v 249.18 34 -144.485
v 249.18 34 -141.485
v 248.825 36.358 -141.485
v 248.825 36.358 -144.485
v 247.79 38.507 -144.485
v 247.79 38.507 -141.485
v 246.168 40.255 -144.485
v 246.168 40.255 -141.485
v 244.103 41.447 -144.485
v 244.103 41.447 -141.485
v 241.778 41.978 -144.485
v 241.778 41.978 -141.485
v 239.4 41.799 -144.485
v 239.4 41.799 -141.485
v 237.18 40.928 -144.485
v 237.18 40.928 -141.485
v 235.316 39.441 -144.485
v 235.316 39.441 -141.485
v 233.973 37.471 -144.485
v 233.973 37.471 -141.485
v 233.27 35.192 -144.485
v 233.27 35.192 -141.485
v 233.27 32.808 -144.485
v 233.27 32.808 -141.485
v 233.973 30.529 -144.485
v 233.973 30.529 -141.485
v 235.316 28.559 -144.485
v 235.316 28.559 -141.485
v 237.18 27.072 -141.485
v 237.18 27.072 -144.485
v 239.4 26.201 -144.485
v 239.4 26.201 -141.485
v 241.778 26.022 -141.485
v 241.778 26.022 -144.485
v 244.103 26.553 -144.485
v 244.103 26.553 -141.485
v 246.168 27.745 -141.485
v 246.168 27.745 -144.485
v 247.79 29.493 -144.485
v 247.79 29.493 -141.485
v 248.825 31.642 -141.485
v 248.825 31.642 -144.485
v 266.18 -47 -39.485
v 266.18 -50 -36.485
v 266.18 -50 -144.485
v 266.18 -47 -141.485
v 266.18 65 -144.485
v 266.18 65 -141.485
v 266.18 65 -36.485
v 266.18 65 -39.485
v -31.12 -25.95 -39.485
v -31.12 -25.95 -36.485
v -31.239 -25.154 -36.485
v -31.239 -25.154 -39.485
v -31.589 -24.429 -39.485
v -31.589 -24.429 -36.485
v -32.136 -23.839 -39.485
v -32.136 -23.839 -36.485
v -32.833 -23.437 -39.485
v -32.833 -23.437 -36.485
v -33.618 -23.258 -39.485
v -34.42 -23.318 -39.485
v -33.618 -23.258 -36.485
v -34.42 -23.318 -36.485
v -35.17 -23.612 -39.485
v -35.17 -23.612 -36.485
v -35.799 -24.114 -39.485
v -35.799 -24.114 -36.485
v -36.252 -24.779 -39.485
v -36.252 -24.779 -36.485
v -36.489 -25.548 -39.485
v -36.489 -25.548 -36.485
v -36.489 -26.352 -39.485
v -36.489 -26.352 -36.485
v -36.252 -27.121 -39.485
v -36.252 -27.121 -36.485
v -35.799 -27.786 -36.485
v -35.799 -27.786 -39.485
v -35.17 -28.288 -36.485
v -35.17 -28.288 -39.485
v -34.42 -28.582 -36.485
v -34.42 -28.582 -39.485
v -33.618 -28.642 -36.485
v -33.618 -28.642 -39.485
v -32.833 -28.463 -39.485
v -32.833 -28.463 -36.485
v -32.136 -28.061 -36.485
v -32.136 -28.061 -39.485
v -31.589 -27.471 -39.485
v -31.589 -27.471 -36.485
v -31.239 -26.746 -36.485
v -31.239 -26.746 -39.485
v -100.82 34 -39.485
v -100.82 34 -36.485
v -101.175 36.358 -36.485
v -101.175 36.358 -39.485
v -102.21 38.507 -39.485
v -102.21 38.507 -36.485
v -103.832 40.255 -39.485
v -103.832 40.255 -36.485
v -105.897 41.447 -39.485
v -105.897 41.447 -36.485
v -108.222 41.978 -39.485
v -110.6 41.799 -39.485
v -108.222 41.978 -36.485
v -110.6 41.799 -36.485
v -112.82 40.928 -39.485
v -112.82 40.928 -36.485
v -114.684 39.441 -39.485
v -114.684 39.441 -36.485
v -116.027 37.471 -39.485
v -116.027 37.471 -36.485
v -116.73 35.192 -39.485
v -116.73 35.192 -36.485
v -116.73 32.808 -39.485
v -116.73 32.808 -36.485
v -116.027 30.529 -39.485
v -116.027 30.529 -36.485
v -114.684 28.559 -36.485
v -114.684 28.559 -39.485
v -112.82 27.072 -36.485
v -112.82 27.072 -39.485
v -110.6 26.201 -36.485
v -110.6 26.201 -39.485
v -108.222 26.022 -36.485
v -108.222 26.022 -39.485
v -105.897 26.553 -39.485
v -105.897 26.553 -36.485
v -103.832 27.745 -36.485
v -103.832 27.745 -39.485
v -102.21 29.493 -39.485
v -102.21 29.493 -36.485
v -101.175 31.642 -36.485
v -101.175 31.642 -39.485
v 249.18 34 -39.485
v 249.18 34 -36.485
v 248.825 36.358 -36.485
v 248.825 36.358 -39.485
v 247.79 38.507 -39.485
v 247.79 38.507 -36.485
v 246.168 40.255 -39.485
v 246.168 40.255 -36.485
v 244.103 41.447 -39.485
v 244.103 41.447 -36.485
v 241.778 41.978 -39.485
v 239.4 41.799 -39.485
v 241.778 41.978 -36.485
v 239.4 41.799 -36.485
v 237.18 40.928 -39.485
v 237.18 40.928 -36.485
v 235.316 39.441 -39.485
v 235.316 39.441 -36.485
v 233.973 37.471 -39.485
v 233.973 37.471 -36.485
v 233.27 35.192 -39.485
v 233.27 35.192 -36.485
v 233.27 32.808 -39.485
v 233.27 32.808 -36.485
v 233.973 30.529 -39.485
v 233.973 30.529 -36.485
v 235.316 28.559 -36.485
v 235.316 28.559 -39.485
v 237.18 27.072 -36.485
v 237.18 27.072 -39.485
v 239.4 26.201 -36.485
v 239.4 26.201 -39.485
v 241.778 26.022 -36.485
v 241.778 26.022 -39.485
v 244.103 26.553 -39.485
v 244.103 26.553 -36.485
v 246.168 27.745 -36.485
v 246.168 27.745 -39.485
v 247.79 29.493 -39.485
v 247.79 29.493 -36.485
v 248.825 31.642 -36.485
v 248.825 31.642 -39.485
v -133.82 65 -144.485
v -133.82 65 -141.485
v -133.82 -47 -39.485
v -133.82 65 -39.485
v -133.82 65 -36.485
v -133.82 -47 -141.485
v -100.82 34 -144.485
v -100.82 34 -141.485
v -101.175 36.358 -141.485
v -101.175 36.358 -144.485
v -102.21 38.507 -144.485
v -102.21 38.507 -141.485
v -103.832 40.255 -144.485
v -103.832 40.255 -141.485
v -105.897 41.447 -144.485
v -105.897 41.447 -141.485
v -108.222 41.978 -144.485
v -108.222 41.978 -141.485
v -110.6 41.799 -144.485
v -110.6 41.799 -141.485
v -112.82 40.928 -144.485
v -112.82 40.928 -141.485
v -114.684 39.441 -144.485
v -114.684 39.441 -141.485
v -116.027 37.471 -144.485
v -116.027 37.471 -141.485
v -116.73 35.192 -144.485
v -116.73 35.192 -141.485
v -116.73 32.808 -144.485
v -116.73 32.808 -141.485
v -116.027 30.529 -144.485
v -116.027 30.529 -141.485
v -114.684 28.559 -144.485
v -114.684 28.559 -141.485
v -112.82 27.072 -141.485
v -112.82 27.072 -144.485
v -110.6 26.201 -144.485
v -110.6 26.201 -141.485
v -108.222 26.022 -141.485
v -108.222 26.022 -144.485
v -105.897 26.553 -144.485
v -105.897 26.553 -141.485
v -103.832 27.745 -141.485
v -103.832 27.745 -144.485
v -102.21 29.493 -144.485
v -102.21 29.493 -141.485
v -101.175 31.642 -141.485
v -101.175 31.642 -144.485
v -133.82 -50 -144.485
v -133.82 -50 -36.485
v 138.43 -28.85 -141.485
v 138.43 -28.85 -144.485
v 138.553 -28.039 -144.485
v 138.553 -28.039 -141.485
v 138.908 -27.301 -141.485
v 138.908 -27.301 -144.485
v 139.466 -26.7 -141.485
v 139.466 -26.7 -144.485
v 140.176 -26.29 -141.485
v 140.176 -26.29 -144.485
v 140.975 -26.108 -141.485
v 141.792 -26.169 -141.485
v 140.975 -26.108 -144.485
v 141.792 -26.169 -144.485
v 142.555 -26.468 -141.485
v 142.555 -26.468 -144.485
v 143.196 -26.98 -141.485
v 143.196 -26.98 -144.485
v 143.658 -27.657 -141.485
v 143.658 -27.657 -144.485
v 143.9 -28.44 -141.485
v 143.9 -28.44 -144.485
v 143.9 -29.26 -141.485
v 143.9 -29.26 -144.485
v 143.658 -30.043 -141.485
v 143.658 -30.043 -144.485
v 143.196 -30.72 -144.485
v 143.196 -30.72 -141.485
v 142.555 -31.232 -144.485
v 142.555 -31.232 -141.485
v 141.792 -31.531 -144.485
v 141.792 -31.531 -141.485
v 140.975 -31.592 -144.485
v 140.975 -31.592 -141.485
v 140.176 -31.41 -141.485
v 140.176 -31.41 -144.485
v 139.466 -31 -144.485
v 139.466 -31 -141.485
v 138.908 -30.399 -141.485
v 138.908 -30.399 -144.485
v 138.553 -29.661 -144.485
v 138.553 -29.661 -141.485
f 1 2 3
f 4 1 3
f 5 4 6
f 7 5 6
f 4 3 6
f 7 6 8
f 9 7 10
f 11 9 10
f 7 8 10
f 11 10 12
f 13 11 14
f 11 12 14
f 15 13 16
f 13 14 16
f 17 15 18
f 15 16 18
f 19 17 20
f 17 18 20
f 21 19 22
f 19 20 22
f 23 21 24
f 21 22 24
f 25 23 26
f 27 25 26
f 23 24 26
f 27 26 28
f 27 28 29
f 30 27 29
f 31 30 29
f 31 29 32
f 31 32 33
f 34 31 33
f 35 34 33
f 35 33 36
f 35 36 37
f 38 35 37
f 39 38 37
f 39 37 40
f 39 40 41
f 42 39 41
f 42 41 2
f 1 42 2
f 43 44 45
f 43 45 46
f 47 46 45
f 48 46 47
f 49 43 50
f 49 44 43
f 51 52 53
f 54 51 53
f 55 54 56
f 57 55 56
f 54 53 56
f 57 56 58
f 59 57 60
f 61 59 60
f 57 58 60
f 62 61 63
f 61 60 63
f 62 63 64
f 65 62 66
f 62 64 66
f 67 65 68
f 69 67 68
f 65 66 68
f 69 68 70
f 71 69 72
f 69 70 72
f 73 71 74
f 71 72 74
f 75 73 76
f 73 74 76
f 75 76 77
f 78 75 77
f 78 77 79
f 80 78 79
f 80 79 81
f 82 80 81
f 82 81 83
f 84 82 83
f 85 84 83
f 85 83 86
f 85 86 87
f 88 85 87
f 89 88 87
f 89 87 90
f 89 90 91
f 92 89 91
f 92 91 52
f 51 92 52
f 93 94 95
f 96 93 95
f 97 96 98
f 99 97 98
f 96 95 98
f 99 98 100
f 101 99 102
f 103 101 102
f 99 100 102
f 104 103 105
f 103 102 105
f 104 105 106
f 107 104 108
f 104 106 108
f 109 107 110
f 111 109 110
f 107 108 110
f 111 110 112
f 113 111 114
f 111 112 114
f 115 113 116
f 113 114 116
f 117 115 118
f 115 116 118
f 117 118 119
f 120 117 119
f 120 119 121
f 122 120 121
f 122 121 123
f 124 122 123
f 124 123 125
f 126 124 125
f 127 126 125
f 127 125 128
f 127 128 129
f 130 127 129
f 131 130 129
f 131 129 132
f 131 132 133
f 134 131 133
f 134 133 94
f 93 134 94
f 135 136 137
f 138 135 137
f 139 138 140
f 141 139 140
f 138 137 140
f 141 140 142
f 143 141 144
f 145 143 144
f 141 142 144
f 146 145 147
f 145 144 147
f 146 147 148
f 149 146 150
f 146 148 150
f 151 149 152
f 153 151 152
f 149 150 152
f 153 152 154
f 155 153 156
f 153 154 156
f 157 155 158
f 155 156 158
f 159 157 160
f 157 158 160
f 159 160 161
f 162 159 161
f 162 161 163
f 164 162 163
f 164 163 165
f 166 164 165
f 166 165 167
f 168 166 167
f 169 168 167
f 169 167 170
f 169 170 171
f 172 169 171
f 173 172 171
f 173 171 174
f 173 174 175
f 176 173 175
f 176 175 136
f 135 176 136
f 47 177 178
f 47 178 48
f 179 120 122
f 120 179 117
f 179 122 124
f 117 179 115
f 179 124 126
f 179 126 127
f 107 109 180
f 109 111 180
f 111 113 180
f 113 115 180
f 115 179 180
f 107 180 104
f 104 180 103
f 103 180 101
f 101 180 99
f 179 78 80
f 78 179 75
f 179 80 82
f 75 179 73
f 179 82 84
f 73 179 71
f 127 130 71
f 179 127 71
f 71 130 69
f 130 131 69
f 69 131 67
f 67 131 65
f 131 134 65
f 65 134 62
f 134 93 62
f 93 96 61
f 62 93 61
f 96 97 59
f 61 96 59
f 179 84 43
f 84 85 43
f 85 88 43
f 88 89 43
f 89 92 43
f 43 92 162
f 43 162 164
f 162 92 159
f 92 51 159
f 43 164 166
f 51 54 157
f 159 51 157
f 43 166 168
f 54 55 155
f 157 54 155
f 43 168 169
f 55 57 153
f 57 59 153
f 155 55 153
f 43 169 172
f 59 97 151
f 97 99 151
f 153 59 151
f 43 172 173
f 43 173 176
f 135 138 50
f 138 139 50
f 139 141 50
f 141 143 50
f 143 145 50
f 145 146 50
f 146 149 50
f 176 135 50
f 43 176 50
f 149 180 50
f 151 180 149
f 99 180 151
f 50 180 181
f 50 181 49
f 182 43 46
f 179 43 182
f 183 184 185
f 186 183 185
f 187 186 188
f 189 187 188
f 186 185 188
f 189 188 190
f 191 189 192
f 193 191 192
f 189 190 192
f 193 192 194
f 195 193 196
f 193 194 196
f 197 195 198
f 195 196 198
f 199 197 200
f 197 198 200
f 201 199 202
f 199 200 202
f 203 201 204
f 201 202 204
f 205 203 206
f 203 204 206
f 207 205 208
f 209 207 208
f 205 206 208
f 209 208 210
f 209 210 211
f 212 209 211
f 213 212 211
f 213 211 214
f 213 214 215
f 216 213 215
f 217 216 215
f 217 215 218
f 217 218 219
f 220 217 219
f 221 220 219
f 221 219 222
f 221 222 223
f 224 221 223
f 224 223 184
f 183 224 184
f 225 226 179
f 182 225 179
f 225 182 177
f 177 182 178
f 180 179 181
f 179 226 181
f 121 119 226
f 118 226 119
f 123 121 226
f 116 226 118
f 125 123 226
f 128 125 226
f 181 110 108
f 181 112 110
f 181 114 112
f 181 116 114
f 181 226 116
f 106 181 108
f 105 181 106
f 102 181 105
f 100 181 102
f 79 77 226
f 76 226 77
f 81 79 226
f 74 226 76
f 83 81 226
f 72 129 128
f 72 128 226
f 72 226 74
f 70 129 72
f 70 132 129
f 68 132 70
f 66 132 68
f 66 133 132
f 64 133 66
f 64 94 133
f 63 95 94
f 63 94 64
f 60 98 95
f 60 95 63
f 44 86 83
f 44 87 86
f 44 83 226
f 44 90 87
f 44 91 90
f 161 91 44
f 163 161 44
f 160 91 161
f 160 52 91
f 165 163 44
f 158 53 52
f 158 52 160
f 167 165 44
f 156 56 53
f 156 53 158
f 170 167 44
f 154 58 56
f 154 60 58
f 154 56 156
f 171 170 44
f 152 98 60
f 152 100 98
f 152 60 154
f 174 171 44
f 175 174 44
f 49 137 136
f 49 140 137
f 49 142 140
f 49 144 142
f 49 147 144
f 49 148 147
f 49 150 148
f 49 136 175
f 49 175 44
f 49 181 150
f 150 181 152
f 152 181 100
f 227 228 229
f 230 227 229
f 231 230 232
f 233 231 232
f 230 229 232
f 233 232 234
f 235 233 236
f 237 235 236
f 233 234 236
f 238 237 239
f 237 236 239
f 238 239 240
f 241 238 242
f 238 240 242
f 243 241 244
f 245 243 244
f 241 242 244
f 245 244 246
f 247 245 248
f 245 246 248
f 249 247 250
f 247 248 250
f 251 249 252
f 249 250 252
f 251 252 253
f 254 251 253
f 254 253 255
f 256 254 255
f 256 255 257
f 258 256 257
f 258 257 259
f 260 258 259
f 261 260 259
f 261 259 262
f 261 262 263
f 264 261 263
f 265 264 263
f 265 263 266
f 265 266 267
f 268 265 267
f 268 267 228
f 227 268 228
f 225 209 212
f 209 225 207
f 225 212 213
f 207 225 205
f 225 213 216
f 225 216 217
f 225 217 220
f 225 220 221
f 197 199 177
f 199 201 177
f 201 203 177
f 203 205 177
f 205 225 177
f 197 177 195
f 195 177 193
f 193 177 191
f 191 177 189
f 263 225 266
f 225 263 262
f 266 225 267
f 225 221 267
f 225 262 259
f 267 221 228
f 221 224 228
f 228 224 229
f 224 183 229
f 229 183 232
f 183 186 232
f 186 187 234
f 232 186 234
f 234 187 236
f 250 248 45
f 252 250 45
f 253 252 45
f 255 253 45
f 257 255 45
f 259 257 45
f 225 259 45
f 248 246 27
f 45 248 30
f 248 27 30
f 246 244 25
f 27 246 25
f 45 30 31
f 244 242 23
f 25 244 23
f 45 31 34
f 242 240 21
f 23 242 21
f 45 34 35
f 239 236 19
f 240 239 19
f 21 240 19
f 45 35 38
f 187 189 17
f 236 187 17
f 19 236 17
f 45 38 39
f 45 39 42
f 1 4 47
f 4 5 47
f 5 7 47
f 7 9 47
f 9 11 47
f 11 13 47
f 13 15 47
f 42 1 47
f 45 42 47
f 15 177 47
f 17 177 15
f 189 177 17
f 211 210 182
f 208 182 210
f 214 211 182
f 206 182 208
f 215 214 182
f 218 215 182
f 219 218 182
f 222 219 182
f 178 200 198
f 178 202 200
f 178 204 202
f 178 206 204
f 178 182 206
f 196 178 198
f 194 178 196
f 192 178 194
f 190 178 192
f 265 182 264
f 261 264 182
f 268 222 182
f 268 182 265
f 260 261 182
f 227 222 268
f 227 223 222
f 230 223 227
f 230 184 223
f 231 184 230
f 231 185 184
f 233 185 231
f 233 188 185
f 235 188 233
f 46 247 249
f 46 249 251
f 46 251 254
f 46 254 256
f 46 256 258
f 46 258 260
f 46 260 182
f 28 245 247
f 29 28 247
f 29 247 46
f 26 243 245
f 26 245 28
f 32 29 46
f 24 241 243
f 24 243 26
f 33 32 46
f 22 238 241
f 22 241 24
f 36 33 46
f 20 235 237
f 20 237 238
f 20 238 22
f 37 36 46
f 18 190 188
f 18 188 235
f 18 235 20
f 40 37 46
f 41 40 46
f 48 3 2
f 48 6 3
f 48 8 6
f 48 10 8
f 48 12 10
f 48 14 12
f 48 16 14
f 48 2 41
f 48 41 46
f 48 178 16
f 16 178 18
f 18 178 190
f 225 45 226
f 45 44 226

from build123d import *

# Parameters (mm, degrees)
SKETCH1_W           = 400
SKETCH1_H           = 108
BOSS_EXTRUDE1_DEPTH = 65
SKETCH3_W           = 400
SKETCH3_H           = 102
CUT_EXTRUDE1_DEPTH  = 158
SKETCH4_R           = 8
CUT_EXTRUDE2_DEPTH  = 158
SKETCH6_W           = 400
SKETCH6_H           = 3
BOSS_EXTRUDE3_DEPTH = 50
SKETCH7_W           = 400
SKETCH7_H           = 3
BOSS_EXTRUDE4_DEPTH = 102
SKETCH11_R          = 2.7
CUT_EXTRUDE4_DEPTH  = 75
SKETCH10_R          = 2.75
CUT_EXTRUDE3_DEPTH  = 75


with BuildPart() as part:
    # Sketch1 → Boss-Extrude1 (new body)
    with BuildSketch(Plane(origin=(0, 0, 0), x_dir=(1, 0, 0), z_dir=(0, 1, 0))):
        with Locations((66.180492252, 90.484958979)):
            Rectangle(SKETCH1_W, SKETCH1_H)
    extrude(amount=BOSS_EXTRUDE1_DEPTH)

    # Sketch3 → Cut-Extrude1 (cut)
    with BuildSketch(Plane.XZ):
        with Locations((66.180492252, -90.484958979)):
            Rectangle(SKETCH3_W, SKETCH3_H)
    extrude(amount=-CUT_EXTRUDE1_DEPTH, mode=Mode.SUBTRACT)


with BuildPart() as cut_extrude1_piece_1:
    # of the separate pieces the step leaves, piece 1, a body of its own (cut_extrude1_pieces)
    add(part.part.solids().sort_by_distance((-133.819507748, 0, -144.484958979))[0])


with BuildPart() as cut_extrude1_piece_2:
    # of the separate pieces the step leaves, piece 2, a body of its own (cut_extrude1_pieces)
    add(part.part.solids().sort_by_distance((-133.819507748, 0, -36.484958979))[0])


with BuildPart() as cut_extrude2_tool:
    # Sketch4 → Cut-Extrude2 (new body)
    with BuildSketch(Plane.XY.offset(-36.484958979)):
        with Locations((-108.819507748, 34)):
            Circle(SKETCH4_R)
        with Locations((241.180492252, 34)):
            Circle(SKETCH4_R)
    extrude(amount=-CUT_EXTRUDE2_DEPTH)


with BuildPart() as cut_extrude1_piece_1_1:
    add(cut_extrude1_piece_1.part)

    # Cut-Extrude2: cut by cut_extrude2_tool
    add(cut_extrude2_tool.part, mode=Mode.SUBTRACT)



with BuildPart() as cut_extrude1_piece_2_1:
    add(cut_extrude1_piece_2.part)

    # Cut-Extrude2: cut by cut_extrude2_tool
    add(cut_extrude2_tool.part, mode=Mode.SUBTRACT)


with BuildPart() as cut_extrude1_piece_1_2:
    add(cut_extrude1_piece_1_1.part)

    add(cut_extrude1_piece_2_1.part)  # Boss-Extrude3 merges Cut-Extrude1 piece 2
    # Sketch6 → Boss-Extrude3 (add)
    with BuildSketch(Plane.XZ):
        with Locations((66.180492252, -37.984958979)):
            Rectangle(SKETCH6_W, SKETCH6_H)
        with Locations((66.180492252, -142.984958979)):
            Rectangle(SKETCH6_W, SKETCH6_H)
    extrude(amount=BOSS_EXTRUDE3_DEPTH)

    # Sketch7 → Boss-Extrude4 (add)
    with BuildSketch(Plane(origin=(0, 0, -39.484958979), x_dir=(-1, 0, 0), z_dir=(0, 0, -1))):
        with Locations((-66.180492252, -48.5)):
            Rectangle(SKETCH7_W, SKETCH7_H)
    extrude(amount=BOSS_EXTRUDE4_DEPTH)

    # Sketch11 → Cut-Extrude4 (cut)
    with BuildSketch(Plane.XY.offset(-36.484958979)):
        with Locations((-33.819507748, -25.95)):
            Circle(SKETCH11_R)
    extrude(amount=-CUT_EXTRUDE4_DEPTH, mode=Mode.SUBTRACT)

    # Sketch10 → Cut-Extrude3 (cut)
    with BuildSketch(Plane(origin=(0, 0, -144.484958979), x_dir=(-1, 0, 0), z_dir=(0, 0, -1))):
        with Locations((-141.180492252, -28.85)):
            Circle(SKETCH10_R)
    extrude(amount=-CUT_EXTRUDE3_DEPTH, mode=Mode.SUBTRACT)


solid = cut_extrude1_piece_1_2.part
